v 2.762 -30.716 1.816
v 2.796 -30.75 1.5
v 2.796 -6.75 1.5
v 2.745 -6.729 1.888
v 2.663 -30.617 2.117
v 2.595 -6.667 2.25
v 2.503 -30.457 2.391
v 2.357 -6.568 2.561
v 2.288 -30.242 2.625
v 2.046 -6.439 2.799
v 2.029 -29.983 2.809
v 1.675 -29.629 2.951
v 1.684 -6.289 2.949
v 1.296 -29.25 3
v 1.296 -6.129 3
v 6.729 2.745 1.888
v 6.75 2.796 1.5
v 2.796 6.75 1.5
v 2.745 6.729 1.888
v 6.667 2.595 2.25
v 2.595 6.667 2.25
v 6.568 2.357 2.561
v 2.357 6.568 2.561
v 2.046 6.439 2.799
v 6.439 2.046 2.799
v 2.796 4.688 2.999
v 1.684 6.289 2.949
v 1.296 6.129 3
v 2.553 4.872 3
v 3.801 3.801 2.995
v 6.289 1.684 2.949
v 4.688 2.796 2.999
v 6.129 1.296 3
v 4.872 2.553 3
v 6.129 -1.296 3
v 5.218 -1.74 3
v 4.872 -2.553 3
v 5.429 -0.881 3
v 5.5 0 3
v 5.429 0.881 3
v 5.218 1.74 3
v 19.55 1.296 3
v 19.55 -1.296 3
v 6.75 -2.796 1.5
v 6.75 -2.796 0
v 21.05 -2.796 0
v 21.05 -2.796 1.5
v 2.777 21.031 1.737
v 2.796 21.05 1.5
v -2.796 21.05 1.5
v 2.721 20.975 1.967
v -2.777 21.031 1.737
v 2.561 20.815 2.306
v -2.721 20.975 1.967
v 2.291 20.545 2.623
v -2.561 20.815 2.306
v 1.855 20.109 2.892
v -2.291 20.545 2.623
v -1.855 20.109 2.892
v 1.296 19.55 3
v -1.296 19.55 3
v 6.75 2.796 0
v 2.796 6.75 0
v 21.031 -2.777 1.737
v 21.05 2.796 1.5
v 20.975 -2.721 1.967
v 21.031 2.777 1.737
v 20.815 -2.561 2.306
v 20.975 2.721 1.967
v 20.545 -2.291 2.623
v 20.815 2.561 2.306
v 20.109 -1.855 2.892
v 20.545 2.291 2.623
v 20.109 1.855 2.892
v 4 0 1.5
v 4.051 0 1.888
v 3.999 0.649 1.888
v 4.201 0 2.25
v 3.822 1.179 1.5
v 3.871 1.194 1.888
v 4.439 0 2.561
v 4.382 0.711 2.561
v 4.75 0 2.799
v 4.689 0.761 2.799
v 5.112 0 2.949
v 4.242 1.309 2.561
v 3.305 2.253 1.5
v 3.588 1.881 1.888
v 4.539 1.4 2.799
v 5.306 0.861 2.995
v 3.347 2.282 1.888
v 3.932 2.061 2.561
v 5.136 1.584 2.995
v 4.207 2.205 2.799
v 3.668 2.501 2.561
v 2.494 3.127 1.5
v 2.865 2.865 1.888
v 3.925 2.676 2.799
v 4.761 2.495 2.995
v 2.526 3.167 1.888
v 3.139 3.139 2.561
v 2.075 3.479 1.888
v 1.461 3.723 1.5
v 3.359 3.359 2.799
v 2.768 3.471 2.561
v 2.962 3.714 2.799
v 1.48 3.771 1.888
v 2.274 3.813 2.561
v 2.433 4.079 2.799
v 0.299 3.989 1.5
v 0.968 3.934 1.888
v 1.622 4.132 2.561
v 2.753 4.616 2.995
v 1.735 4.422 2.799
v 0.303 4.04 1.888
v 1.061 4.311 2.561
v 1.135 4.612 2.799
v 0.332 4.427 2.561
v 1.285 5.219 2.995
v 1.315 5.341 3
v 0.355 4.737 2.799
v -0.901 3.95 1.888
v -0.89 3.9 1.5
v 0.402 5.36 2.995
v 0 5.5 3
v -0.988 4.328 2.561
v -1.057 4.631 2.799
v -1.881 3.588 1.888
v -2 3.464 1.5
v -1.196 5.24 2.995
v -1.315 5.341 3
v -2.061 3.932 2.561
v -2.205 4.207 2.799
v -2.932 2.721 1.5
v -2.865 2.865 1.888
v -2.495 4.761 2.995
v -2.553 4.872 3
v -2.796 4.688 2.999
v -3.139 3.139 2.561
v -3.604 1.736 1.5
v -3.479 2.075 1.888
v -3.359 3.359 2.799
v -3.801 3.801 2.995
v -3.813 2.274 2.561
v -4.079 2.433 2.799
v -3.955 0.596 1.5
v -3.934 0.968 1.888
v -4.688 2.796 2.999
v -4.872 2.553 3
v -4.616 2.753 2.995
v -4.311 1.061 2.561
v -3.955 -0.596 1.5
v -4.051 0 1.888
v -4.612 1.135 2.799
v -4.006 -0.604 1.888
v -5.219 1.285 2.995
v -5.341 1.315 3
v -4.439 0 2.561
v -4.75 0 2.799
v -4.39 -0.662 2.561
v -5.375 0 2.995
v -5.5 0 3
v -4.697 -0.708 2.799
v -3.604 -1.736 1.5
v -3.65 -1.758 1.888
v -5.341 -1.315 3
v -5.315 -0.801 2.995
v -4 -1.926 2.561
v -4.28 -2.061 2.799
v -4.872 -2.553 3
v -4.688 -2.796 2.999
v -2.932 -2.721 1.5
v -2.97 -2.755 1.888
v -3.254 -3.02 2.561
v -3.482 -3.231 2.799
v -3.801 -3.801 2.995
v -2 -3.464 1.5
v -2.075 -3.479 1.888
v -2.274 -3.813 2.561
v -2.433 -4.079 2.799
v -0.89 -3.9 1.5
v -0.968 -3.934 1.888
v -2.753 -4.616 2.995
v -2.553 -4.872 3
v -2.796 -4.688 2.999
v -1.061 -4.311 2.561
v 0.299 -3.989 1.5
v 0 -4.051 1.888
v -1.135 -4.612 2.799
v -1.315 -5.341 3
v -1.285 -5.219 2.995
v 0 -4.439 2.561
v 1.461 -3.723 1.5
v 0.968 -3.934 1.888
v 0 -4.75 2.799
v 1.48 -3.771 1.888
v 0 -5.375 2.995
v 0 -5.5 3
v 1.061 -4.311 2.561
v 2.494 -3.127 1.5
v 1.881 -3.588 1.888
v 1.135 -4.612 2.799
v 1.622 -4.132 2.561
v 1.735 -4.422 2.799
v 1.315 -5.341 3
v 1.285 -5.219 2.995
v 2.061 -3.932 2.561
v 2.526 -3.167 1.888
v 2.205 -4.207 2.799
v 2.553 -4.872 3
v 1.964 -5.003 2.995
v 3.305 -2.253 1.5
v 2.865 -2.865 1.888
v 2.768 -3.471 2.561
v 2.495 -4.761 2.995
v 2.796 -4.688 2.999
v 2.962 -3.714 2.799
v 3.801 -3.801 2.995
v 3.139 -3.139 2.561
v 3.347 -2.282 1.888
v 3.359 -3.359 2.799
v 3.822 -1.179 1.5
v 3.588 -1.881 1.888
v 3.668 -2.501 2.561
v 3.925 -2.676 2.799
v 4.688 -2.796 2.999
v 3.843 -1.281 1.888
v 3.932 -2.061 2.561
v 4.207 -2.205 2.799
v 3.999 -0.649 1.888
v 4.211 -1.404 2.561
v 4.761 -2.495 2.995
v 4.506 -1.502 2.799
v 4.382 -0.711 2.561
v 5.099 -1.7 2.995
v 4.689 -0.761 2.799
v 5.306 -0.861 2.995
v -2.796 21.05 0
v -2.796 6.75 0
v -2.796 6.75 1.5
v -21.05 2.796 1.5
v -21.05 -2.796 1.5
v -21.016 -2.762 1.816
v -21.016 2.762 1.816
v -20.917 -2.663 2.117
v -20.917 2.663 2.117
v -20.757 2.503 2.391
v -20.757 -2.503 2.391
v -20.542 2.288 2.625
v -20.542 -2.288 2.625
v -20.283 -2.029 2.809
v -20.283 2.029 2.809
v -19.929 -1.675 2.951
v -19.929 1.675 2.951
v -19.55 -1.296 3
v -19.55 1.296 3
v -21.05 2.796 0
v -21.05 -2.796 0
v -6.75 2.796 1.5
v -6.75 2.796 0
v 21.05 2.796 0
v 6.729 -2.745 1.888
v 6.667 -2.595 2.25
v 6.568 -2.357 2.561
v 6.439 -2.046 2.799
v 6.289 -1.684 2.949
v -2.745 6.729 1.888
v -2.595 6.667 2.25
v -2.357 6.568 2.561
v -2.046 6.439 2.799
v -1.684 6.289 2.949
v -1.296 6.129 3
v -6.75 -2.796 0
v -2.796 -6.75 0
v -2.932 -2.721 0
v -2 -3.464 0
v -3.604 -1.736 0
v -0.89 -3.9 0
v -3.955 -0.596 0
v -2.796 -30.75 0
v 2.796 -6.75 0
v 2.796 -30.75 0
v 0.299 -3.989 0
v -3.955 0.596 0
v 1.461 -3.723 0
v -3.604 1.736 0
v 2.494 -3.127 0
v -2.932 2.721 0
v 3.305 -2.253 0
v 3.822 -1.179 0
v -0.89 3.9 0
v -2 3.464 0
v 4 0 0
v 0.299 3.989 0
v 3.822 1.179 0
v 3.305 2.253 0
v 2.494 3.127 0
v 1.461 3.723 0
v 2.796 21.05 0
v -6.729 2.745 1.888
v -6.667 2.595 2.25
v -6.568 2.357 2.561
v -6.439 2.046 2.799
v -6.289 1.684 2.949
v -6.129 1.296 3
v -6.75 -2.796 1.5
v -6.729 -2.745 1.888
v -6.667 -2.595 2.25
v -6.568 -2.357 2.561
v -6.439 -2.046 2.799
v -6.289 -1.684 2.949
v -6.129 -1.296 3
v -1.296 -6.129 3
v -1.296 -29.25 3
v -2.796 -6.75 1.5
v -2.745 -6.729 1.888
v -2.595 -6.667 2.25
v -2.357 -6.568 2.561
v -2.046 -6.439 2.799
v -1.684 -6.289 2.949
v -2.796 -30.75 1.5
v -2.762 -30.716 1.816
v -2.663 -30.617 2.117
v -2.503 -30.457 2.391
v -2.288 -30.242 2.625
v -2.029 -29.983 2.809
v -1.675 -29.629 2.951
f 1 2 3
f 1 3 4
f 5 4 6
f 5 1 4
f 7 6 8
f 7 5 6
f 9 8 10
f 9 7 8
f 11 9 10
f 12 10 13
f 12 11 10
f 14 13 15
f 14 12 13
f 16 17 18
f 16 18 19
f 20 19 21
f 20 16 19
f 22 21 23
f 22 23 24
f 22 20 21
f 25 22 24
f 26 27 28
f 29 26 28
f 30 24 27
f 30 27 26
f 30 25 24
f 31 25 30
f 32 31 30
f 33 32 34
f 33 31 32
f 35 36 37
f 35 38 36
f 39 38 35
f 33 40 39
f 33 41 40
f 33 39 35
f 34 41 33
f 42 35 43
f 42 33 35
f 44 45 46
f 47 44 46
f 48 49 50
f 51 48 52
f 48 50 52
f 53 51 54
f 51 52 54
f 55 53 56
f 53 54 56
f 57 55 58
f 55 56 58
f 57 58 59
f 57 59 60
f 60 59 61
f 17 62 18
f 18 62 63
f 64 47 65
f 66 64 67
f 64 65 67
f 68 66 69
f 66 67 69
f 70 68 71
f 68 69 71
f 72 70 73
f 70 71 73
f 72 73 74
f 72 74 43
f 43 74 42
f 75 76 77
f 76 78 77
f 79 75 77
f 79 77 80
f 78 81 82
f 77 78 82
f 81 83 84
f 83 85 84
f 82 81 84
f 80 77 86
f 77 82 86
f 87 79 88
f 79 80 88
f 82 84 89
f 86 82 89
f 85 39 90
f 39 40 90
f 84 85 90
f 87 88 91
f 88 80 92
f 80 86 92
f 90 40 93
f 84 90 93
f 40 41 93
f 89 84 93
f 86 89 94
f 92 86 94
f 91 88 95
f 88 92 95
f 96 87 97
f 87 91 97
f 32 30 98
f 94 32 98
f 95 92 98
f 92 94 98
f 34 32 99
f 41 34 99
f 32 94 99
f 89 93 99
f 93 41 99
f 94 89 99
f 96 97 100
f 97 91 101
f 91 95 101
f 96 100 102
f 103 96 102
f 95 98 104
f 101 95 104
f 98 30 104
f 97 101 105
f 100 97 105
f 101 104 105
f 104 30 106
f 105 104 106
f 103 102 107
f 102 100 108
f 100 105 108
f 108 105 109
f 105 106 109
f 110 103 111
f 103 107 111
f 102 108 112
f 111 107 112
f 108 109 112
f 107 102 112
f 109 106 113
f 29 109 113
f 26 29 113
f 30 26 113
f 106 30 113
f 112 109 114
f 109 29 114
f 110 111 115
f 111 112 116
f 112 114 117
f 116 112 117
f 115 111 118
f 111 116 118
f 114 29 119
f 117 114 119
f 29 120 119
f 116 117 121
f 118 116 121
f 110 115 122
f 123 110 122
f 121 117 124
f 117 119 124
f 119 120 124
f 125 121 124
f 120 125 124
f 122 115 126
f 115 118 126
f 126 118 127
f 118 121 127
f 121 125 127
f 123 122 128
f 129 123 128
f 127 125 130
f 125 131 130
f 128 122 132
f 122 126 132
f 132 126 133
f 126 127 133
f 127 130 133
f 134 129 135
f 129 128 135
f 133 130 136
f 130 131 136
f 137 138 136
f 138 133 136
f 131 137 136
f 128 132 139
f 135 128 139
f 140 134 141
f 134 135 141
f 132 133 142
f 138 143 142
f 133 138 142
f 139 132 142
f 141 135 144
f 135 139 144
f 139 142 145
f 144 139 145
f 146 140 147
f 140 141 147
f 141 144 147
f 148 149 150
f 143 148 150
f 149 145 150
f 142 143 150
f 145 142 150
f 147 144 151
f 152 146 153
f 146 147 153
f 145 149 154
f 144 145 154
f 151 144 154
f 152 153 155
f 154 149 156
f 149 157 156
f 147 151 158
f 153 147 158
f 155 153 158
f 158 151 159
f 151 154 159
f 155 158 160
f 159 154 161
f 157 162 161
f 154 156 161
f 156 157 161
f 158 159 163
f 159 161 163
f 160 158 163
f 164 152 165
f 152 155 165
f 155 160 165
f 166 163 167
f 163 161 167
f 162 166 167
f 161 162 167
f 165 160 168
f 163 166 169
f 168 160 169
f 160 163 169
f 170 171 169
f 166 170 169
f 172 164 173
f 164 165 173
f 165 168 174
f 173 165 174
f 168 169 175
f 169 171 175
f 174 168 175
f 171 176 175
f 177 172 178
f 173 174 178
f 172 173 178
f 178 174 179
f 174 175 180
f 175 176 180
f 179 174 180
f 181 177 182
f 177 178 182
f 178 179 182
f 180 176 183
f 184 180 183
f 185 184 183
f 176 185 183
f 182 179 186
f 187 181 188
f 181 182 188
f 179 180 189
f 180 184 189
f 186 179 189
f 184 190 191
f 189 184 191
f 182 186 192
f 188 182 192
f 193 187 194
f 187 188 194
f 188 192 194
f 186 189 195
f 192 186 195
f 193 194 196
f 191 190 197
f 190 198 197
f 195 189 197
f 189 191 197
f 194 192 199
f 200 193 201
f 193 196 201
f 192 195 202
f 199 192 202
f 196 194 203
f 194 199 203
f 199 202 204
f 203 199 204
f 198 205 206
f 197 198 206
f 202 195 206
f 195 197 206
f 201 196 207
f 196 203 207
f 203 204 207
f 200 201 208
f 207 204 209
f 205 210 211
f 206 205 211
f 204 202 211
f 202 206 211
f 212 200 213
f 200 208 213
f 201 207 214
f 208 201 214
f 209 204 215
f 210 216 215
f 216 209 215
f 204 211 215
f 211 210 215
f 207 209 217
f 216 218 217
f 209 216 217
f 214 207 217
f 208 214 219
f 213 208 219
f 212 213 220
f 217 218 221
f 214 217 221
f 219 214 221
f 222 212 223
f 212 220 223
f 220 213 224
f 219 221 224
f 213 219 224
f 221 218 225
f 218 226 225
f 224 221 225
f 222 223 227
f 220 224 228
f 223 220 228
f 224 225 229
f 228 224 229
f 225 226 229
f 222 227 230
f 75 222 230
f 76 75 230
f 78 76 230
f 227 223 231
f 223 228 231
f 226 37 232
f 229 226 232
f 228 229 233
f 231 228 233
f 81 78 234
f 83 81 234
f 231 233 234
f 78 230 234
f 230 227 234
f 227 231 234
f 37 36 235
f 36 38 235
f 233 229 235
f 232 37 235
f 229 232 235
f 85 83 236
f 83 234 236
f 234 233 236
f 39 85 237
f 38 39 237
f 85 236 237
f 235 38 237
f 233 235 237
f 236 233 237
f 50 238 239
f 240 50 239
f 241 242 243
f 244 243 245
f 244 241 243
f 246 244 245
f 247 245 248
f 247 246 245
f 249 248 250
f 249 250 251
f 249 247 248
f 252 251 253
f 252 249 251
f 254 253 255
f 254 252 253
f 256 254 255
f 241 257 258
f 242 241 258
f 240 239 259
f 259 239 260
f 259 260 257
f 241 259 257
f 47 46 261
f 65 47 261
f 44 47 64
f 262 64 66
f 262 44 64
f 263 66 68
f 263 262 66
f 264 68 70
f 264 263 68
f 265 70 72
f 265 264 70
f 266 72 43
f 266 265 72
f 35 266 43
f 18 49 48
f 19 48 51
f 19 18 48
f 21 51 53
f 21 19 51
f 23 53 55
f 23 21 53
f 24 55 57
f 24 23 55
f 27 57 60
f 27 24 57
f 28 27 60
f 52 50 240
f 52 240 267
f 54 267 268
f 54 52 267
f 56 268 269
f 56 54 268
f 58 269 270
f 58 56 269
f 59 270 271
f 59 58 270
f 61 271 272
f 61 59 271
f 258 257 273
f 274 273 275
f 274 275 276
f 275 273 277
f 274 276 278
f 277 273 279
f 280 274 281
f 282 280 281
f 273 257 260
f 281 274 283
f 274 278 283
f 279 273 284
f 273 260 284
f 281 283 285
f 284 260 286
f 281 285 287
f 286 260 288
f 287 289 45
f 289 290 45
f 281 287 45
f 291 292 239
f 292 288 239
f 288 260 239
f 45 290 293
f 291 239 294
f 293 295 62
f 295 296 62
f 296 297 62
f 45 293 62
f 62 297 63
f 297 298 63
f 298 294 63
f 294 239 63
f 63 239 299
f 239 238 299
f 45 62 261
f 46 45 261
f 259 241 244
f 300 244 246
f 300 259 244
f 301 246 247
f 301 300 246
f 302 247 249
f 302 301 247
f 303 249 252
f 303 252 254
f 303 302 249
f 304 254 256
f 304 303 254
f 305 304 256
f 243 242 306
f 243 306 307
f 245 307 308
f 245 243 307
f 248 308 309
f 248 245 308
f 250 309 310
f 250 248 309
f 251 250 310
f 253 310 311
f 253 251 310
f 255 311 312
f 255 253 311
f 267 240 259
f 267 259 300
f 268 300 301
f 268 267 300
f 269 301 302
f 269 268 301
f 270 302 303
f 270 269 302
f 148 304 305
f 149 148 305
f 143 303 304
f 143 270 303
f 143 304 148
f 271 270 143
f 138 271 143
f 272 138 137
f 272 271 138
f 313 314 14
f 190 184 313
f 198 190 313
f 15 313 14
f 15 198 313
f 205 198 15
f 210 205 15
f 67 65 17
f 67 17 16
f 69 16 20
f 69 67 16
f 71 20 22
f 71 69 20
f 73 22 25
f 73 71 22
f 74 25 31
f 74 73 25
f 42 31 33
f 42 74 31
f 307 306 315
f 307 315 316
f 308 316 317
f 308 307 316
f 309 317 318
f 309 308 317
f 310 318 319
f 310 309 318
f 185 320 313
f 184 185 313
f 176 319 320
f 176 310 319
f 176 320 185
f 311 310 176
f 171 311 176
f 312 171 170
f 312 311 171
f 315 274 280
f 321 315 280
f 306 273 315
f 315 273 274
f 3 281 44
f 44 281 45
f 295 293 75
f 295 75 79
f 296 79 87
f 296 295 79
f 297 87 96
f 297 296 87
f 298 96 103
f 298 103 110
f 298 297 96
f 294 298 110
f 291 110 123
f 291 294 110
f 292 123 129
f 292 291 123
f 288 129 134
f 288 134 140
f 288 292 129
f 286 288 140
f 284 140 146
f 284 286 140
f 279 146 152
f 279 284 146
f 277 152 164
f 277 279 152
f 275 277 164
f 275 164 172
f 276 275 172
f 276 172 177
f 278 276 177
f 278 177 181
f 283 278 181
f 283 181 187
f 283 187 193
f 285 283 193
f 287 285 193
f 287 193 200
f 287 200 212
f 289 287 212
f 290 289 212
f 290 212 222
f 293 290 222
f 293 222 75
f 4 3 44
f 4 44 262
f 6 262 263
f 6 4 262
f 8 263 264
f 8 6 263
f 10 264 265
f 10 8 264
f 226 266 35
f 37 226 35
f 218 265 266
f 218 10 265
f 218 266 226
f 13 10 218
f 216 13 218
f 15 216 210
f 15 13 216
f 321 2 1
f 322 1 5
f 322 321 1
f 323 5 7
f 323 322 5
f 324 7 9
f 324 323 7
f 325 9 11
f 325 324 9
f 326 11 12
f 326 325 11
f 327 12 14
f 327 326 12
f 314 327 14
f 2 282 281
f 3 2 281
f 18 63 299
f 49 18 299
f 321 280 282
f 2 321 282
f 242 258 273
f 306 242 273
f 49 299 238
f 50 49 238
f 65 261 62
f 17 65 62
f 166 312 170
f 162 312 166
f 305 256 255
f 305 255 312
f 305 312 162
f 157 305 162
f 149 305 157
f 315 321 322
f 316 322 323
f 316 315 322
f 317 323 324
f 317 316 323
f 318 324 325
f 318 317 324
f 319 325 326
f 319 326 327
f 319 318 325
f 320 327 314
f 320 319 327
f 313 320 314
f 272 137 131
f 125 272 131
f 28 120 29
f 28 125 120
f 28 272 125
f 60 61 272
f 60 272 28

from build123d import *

# Parameters (mm, degrees)
F0_R          = 4
F1_DEPTH      = 3
F2_T1_DEPTH   = 13.091883092
F2_T3_DEPTH   = 13.091883092
F2_T8_DEPTH   = 21.8
F2_T13_DEPTH  = 31.5
F2_T18_DEPTH  = 13.091883092
F2_T24_DEPTH  = 21.8
F2_T29_DEPTH  = 21.8
F2_T34_DEPTH  = 31.5
F2_T39_DEPTH  = 13.091883092
F2_T45_DEPTH  = 13.091883092
F2_T51_DEPTH  = 21.8
F2_T56_DEPTH  = 21.8
F2_T61_DEPTH  = 21.8
F2_T66_DEPTH  = 13.091883092
F2_T75_DEPTH  = 13.091883092
F2_T79_DEPTH  = 21.8
F2_T86_DEPTH  = 31.5
F2_T90_DEPTH  = 13.091883092
F2_T97_DEPTH  = 13.091883092
F2_T101_DEPTH = 21.8
F2_T108_DEPTH = 21.8
F2_T112_DEPTH = 13.091883092
F2_T119_DEPTH = 13.091883092
F2_T123_DEPTH = 31.5
F2_T130_DEPTH = 21.8
F2_T134_DEPTH = 13.091883092
F2_T141_DEPTH = 21.8
F2_T145_DEPTH = 13.091883092
F2_T152_DEPTH = 21.8
F2_T156_DEPTH = 13.091883092


# Not quite as in the source:
# - a fillet or chamfer that OpenCascade refuses, or shapes differently, is made with other operations: its cross-section is extruded or revolved along the edge and cut away or added


with BuildPart() as f1:
    # F0 (on Top) → F1 (new body)
    with BuildSketch(Plane.XY):
        Polygon((-6.75, -2.795941546), (-2.795941546, -6.75), (-2.795941546, -30.75), (2.795941546, -30.75), (2.795941546, -6.75), (6.75, -2.795941546), (21.05, -2.795941546), (21.05, 2.795941546), (6.75, 2.795941546), (2.795941546, 6.75), (2.795941546, 21.05), (-2.795941546, 21.05), (-2.795941546, 6.75), (-6.75, 2.795941546), (-21.05, 2.795941546), (-21.05, -2.795941546), align=None)
        Circle(F0_R, mode=Mode.SUBTRACT)
    extrude(amount=F1_DEPTH)

    # F2: fillet of radius 1.5 on 17 edges, made by hand

    # F2_s2 → F2_t1 (cut)
    with BuildSketch(Plane.XZ.offset(-6.545941546)):
        with BuildLine():
            ThreePointArc((-21.05, 1.5), (-20.6106601718, 2.5606601718), (-19.55, 3))
            Line((-19.55, 3), (-21.05, 3))
            Line((-21.05, 3), (-21.05, 1.5))
        make_face()
        with BuildLine():
            ThreePointArc((21.05, 1.5), (20.6106601718, 2.5606601718), (19.55, 3))
            Line((19.55, 3), (21.05, 3))
            Line((21.05, 3), (21.05, 1.5))
        make_face()
    extrude(amount=F2_T1_DEPTH, mode=Mode.SUBTRACT)

    # F2_s4 → F2_t3 (cut)
    with BuildSketch(Plane.YZ.offset(-6.545941546)):
        with BuildLine():
            ThreePointArc((-30.75, 1.5), (-30.3106601718, 2.5606601718), (-29.25, 3))
            Line((-29.25, 3), (-30.75, 3))
            Line((-30.75, 3), (-30.75, 1.5))
        make_face()
        with BuildLine():
            ThreePointArc((21.05, 1.5), (20.6106601718, 2.5606601718), (19.55, 3))
            Line((19.55, 3), (21.05, 3))
            Line((21.05, 3), (21.05, 1.5))
        make_face()
    extrude(amount=F2_T3_DEPTH, mode=Mode.SUBTRACT)


with BuildPart() as f2_tool6:
    # F2_s7 → F2_t8 (new body)
    with BuildSketch(Plane.YZ.offset(-3)):
        with BuildLine():
            ThreePointArc((2.795941546, 1.5), (2.3566017178, 2.5606601718), (1.295941546, 3))
            Line((1.295941546, 3), (2.795941546, 3))
            Line((2.795941546, 3), (2.795941546, 1.5))
        make_face()
    extrude(amount=-F2_T8_DEPTH)

    split(bisect_by=Plane(origin=(-4.772970773, 4.772970773, 0), x_dir=(0, 0, 1), z_dir=(-0.7071067812, 0.7071067812, 0)), keep=Keep.TOP)


with BuildPart() as f1_1:
    add(f1.part)

    # F2_t5: cut F2_tool6
    add(f2_tool6.part, mode=Mode.SUBTRACT)


with BuildPart() as f2_tool11:
    # F2_s12 → F2_t13 (new body)
    with BuildSketch(Plane.XZ.offset(34.5)):
        with BuildLine():
            ThreePointArc((2.795941546, 1.5), (2.3566017178, 2.5606601718), (1.295941546, 3))
            Line((1.295941546, 3), (2.795941546, 3))
            Line((2.795941546, 3), (2.795941546, 1.5))
        make_face()
    extrude(amount=-F2_T13_DEPTH)

    split(bisect_by=Plane(origin=(4.772970773, -4.772970773, 0), x_dir=(0, 0, 1), z_dir=(0.7071067812, -0.7071067812, 0)), keep=Keep.TOP)


with BuildPart() as f1_2:
    add(f1_1.part)

    # F2_t10: cut F2_tool11
    add(f2_tool11.part, mode=Mode.SUBTRACT)


with BuildPart() as f2_tool16:
    # F2_s17 → F2_t18 (new body)
    with BuildSketch(Plane(origin=(-4.6286796564, -4.6286796564, 0), x_dir=(0, 0, 1), z_dir=(0.7071067812, 0.7071067812, 0))):
        with BuildLine():
            ThreePointArc((1.5, 6.75), (2.5606601718, 6.3106601718), (3, 5.25))
            Line((3, 5.25), (3, 6.75))
            Line((3, 6.75), (1.5, 6.75))
        make_face()
    extrude(amount=F2_T18_DEPTH)

    split(bisect_by=Plane.YZ.offset(2.795941546), keep=Keep.TOP)

    split(bisect_by=Plane.XZ.offset(2.795941546), keep=Keep.TOP)


with BuildPart() as f1_3:
    add(f1_2.part)

    # F2_t15: cut F2_tool16
    add(f2_tool16.part, mode=Mode.SUBTRACT)


with BuildPart() as f2_tool22:
    # F2_s23 → F2_t24 (new body)
    with BuildSketch(Plane.YZ.offset(3)):
        with BuildLine():
            ThreePointArc((-2.795941546, 1.5), (-2.3566017178, 2.5606601718), (-1.295941546, 3))
            Line((-1.295941546, 3), (-2.795941546, 3))
            Line((-2.795941546, 3), (-2.795941546, 1.5))
        make_face()
    extrude(amount=F2_T24_DEPTH)

    split(bisect_by=Plane(origin=(4.772970773, -4.772970773, 0), x_dir=(0, 0, 1), z_dir=(0.7071067812, -0.7071067812, 0)), keep=Keep.TOP)


with BuildPart() as f1_4:
    add(f1_3.part)

    # F2_t21: cut F2_tool22
    add(f2_tool22.part, mode=Mode.SUBTRACT)


with BuildPart() as f2_tool27:
    # F2_s28 → F2_t29 (new body)
    with BuildSketch(Plane.YZ.offset(-24.8)):
        with BuildLine():
            ThreePointArc((-2.795941546, 1.5), (-2.3566017178, 2.5606601718), (-1.295941546, 3))
            Line((-1.295941546, 3), (-2.795941546, 3))
            Line((-2.795941546, 3), (-2.795941546, 1.5))
        make_face()
    extrude(amount=F2_T29_DEPTH)

    split(bisect_by=Plane(origin=(-4.772970773, -4.772970773, 0), x_dir=(0, 0, 1), z_dir=(-0.7071067812, -0.7071067812, 0)), keep=Keep.TOP)


with BuildPart() as f1_5:
    add(f1_4.part)

    # F2_t26: cut F2_tool27
    add(f2_tool27.part, mode=Mode.SUBTRACT)


with BuildPart() as f2_tool32:
    # F2_s33 → F2_t34 (new body)
    with BuildSketch(Plane.XZ.offset(3)):
        with BuildLine():
            ThreePointArc((-2.795941546, 1.5), (-2.3566017178, 2.5606601718), (-1.295941546, 3))
            Line((-1.295941546, 3), (-2.795941546, 3))
            Line((-2.795941546, 3), (-2.795941546, 1.5))
        make_face()
    extrude(amount=F2_T34_DEPTH)

    split(bisect_by=Plane(origin=(-4.772970773, -4.772970773, 0), x_dir=(0, 0, 1), z_dir=(-0.7071067812, -0.7071067812, 0)), keep=Keep.TOP)


with BuildPart() as f1_6:
    add(f1_5.part)

    # F2_t31: cut F2_tool32
    add(f2_tool32.part, mode=Mode.SUBTRACT)


with BuildPart() as f2_tool37:
    # F2_s38 → F2_t39 (new body)
    with BuildSketch(Plane(origin=(-4.6286796564, 4.6286796564, 0), x_dir=(0, 0, 1), z_dir=(0.7071067812, -0.7071067812, 0))):
        with BuildLine():
            ThreePointArc((1.5, 6.75), (2.5606601718, 6.3106601718), (3, 5.25))
            Line((3, 5.25), (3, 6.75))
            Line((3, 6.75), (1.5, 6.75))
        make_face()
    extrude(amount=F2_T39_DEPTH)

    split(bisect_by=Plane.XZ.offset(2.795941546), keep=Keep.TOP)

    split(bisect_by=Plane.YZ.offset(-2.795941546), keep=Keep.BOTTOM)


with BuildPart() as f1_7:
    add(f1_6.part)

    # F2_t36: cut F2_tool37
    add(f2_tool37.part, mode=Mode.SUBTRACT)


with BuildPart() as f2_tool43:
    # F2_s44 → F2_t45 (new body)
    with BuildSketch(Plane(origin=(4.6286796564, 4.6286796564, 0), x_dir=(0, 0, 1), z_dir=(-0.7071067812, -0.7071067812, 0))):
        with BuildLine():
            ThreePointArc((1.5, 6.75), (2.5606601718, 6.3106601718), (3, 5.25))
            Line((3, 5.25), (3, 6.75))
            Line((3, 6.75), (1.5, 6.75))
        make_face()
    extrude(amount=F2_T45_DEPTH)

    split(bisect_by=Plane.YZ.offset(-2.795941546), keep=Keep.BOTTOM)

    split(bisect_by=Plane.XZ.offset(-2.795941546), keep=Keep.BOTTOM)


with BuildPart() as f1_8:
    add(f1_7.part)

    # F2_t42: cut F2_tool43
    add(f2_tool43.part, mode=Mode.SUBTRACT)


with BuildPart() as f2_tool49:
    # F2_s50 → F2_t51 (new body)
    with BuildSketch(Plane.XZ.offset(-24.8)):
        with BuildLine():
            ThreePointArc((-2.795941546, 1.5), (-2.3566017178, 2.5606601718), (-1.295941546, 3))
            Line((-1.295941546, 3), (-2.795941546, 3))
            Line((-2.795941546, 3), (-2.795941546, 1.5))
        make_face()
    extrude(amount=F2_T51_DEPTH)

    split(bisect_by=Plane(origin=(-4.772970773, 4.772970773, 0), x_dir=(0, 0, 1), z_dir=(-0.7071067812, 0.7071067812, 0)), keep=Keep.TOP)


with BuildPart() as f1_9:
    add(f1_8.part)

    # F2_t48: cut F2_tool49
    add(f2_tool49.part, mode=Mode.SUBTRACT)


with BuildPart() as f2_tool54:
    # F2_s55 → F2_t56 (new body)
    with BuildSketch(Plane.XZ.offset(-3)):
        with BuildLine():
            ThreePointArc((2.795941546, 1.5), (2.3566017178, 2.5606601718), (1.295941546, 3))
            Line((1.295941546, 3), (2.795941546, 3))
            Line((2.795941546, 3), (2.795941546, 1.5))
        make_face()
    extrude(amount=-F2_T56_DEPTH)

    split(bisect_by=Plane(origin=(4.772970773, 4.772970773, 0), x_dir=(0, 0, 1), z_dir=(0.7071067812, 0.7071067812, 0)), keep=Keep.TOP)


with BuildPart() as f1_10:
    add(f1_9.part)

    # F2_t53: cut F2_tool54
    add(f2_tool54.part, mode=Mode.SUBTRACT)


with BuildPart() as f2_tool59:
    # F2_s60 → F2_t61 (new body)
    with BuildSketch(Plane.YZ.offset(24.8)):
        with BuildLine():
            ThreePointArc((2.795941546, 1.5), (2.3566017178, 2.5606601718), (1.295941546, 3))
            Line((1.295941546, 3), (2.795941546, 3))
            Line((2.795941546, 3), (2.795941546, 1.5))
        make_face()
    extrude(amount=-F2_T61_DEPTH)

    split(bisect_by=Plane(origin=(4.772970773, 4.772970773, 0), x_dir=(0, 0, 1), z_dir=(0.7071067812, 0.7071067812, 0)), keep=Keep.TOP)


with BuildPart() as f1_11:
    add(f1_10.part)

    # F2_t58: cut F2_tool59
    add(f2_tool59.part, mode=Mode.SUBTRACT)


with BuildPart() as f2_tool64:
    # F2_s65 → F2_t66 (new body)
    with BuildSketch(Plane(origin=(4.6286796564, -4.6286796564, 0), x_dir=(0, 0, 1), z_dir=(-0.7071067812, 0.7071067812, 0))):
        with BuildLine():
            ThreePointArc((1.5, 6.75), (2.5606601718, 6.3106601718), (3, 5.25))
            Line((3, 5.25), (3, 6.75))
            Line((3, 6.75), (1.5, 6.75))
        make_face()
    extrude(amount=F2_T66_DEPTH)

    split(bisect_by=Plane.YZ.offset(2.795941546), keep=Keep.TOP)

    split(bisect_by=Plane.XZ.offset(-2.795941546), keep=Keep.BOTTOM)


with BuildPart() as f1_12:
    add(f1_11.part)

    # F2_t63: cut F2_tool64
    add(f2_tool64.part, mode=Mode.SUBTRACT)

    # F2_s69 → F2_t70 (revolve, cut)
    with BuildSketch(Plane.XZ):
        with BuildLine():
            ThreePointArc((4, 1.5), (4.4393398282, 2.5606601718), (5.5, 3))
            Line((5.5, 3), (4, 3))
            Line((4, 3), (4, 1.5))
        make_face()
    revolve(axis=Axis((0, 0, 3), (0, 0, 1)), mode=Mode.SUBTRACT)


with BuildPart() as f2_tool73:
    # F2_s74 → F2_t75 (new body)
    with BuildSketch(Plane(origin=(4.6286796564, 4.6286796564, 0), x_dir=(0, 0, 1), z_dir=(-0.7071067812, -0.7071067812, 0))):
        with BuildLine():
            ThreePointArc((1.5, 6.75), (2.5606601718, 6.3106601718), (3, 5.25))
            Line((3, 5.25), (3, 6.75))
            Line((3, 6.75), (1.5, 6.75))
        make_face()
    extrude(amount=F2_T75_DEPTH)

    split(bisect_by=Plane.XZ.offset(-2.795941546), keep=Keep.TOP)


with BuildPart() as f2_tool77:
    # F2_s78 → F2_t79 (new body)
    with BuildSketch(Plane.YZ.offset(-3)):
        with BuildLine():
            ThreePointArc((2.795941546, 1.5), (2.3566017178, 2.5606601718), (1.295941546, 3))
            Line((1.295941546, 3), (2.795941546, 3))
            Line((2.795941546, 3), (2.795941546, 1.5))
        make_face()
    extrude(amount=-F2_T79_DEPTH)

    split(bisect_by=Plane(origin=(-4.772970773, 4.772970773, 0), x_dir=(0, 0, 1), z_dir=(0.7071067812, -0.7071067812, 0)), keep=Keep.TOP)


with BuildPart() as f2_tool73_1:
    add(f2_tool73.part)

    # F2_t81: intersect F2_tool77
    add(f2_tool77.part, mode=Mode.INTERSECT)


with BuildPart() as f1_13:
    add(f1_12.part)

    # F2_t71: cut F2_tool73
    add(f2_tool73_1.part, mode=Mode.SUBTRACT)


with BuildPart() as f2_tool84:
    # F2_s85 → F2_t86 (new body)
    with BuildSketch(Plane.XZ.offset(34.5)):
        with BuildLine():
            ThreePointArc((2.795941546, 1.5), (2.3566017178, 2.5606601718), (1.295941546, 3))
            Line((1.295941546, 3), (2.795941546, 3))
            Line((2.795941546, 3), (2.795941546, 1.5))
        make_face()
    extrude(amount=-F2_T86_DEPTH)

    split(bisect_by=Plane(origin=(4.772970773, -4.772970773, 0), x_dir=(0, 0, 1), z_dir=(-0.7071067812, 0.7071067812, 0)), keep=Keep.TOP)


with BuildPart() as f2_tool88:
    # F2_s89 → F2_t90 (new body)
    with BuildSketch(Plane(origin=(-4.6286796564, -4.6286796564, 0), x_dir=(0, 0, 1), z_dir=(0.7071067812, 0.7071067812, 0))):
        with BuildLine():
            ThreePointArc((1.5, 6.75), (2.5606601718, 6.3106601718), (3, 5.25))
            Line((3, 5.25), (3, 6.75))
            Line((3, 6.75), (1.5, 6.75))
        make_face()
    extrude(amount=F2_T90_DEPTH)

    split(bisect_by=Plane.YZ.offset(2.795941546), keep=Keep.BOTTOM)


with BuildPart() as f2_tool84_1:
    add(f2_tool84.part)

    # F2_t92: intersect F2_tool88
    add(f2_tool88.part, mode=Mode.INTERSECT)


with BuildPart() as f1_14:
    add(f1_13.part)

    # F2_t82: cut F2_tool84
    add(f2_tool84_1.part, mode=Mode.SUBTRACT)


with BuildPart() as f2_tool95:
    # F2_s96 → F2_t97 (new body)
    with BuildSketch(Plane(origin=(-4.6286796564, -4.6286796564, 0), x_dir=(0, 0, 1), z_dir=(0.7071067812, 0.7071067812, 0))):
        with BuildLine():
            ThreePointArc((1.5, 6.75), (2.5606601718, 6.3106601718), (3, 5.25))
            Line((3, 5.25), (3, 6.75))
            Line((3, 6.75), (1.5, 6.75))
        make_face()
    extrude(amount=F2_T97_DEPTH)

    split(bisect_by=Plane.XZ.offset(2.795941546), keep=Keep.BOTTOM)


with BuildPart() as f2_tool99:
    # F2_s100 → F2_t101 (new body)
    with BuildSketch(Plane.YZ.offset(3)):
        with BuildLine():
            ThreePointArc((-2.795941546, 1.5), (-2.3566017178, 2.5606601718), (-1.295941546, 3))
            Line((-1.295941546, 3), (-2.795941546, 3))
            Line((-2.795941546, 3), (-2.795941546, 1.5))
        make_face()
    extrude(amount=F2_T101_DEPTH)

    split(bisect_by=Plane(origin=(4.772970773, -4.772970773, 0), x_dir=(0, 0, 1), z_dir=(-0.7071067812, 0.7071067812, 0)), keep=Keep.TOP)


with BuildPart() as f2_tool95_1:
    add(f2_tool95.part)

    # F2_t103: intersect F2_tool99
    add(f2_tool99.part, mode=Mode.INTERSECT)


with BuildPart() as f1_15:
    add(f1_14.part)

    # F2_t93: cut F2_tool95
    add(f2_tool95_1.part, mode=Mode.SUBTRACT)


with BuildPart() as f2_tool106:
    # F2_s107 → F2_t108 (new body)
    with BuildSketch(Plane.YZ.offset(-24.8)):
        with BuildLine():
            ThreePointArc((-2.795941546, 1.5), (-2.3566017178, 2.5606601718), (-1.295941546, 3))
            Line((-1.295941546, 3), (-2.795941546, 3))
            Line((-2.795941546, 3), (-2.795941546, 1.5))
        make_face()
    extrude(amount=F2_T108_DEPTH)

    split(bisect_by=Plane(origin=(-4.772970773, -4.772970773, 0), x_dir=(0, 0, 1), z_dir=(0.7071067812, 0.7071067812, 0)), keep=Keep.TOP)


with BuildPart() as f2_tool110:
    # F2_s111 → F2_t112 (new body)
    with BuildSketch(Plane(origin=(-4.6286796564, 4.6286796564, 0), x_dir=(0, 0, 1), z_dir=(0.7071067812, -0.7071067812, 0))):
        with BuildLine():
            ThreePointArc((1.5, 6.75), (2.5606601718, 6.3106601718), (3, 5.25))
            Line((3, 5.25), (3, 6.75))
            Line((3, 6.75), (1.5, 6.75))
        make_face()
    extrude(amount=F2_T112_DEPTH)

    split(bisect_by=Plane.XZ.offset(2.795941546), keep=Keep.BOTTOM)


with BuildPart() as f2_tool106_1:
    add(f2_tool106.part)

    # F2_t114: intersect F2_tool110
    add(f2_tool110.part, mode=Mode.INTERSECT)


with BuildPart() as f1_16:
    add(f1_15.part)

    # F2_t104: cut F2_tool106
    add(f2_tool106_1.part, mode=Mode.SUBTRACT)


with BuildPart() as f2_tool117:
    # F2_s118 → F2_t119 (new body)
    with BuildSketch(Plane(origin=(-4.6286796564, 4.6286796564, 0), x_dir=(0, 0, 1), z_dir=(0.7071067812, -0.7071067812, 0))):
        with BuildLine():
            ThreePointArc((1.5, 6.75), (2.5606601718, 6.3106601718), (3, 5.25))
            Line((3, 5.25), (3, 6.75))
            Line((3, 6.75), (1.5, 6.75))
        make_face()
    extrude(amount=F2_T119_DEPTH)

    split(bisect_by=Plane.YZ.offset(-2.795941546), keep=Keep.TOP)


with BuildPart() as f2_tool121:
    # F2_s122 → F2_t123 (new body)
    with BuildSketch(Plane.XZ.offset(3)):
        with BuildLine():
            ThreePointArc((-2.795941546, 1.5), (-2.3566017178, 2.5606601718), (-1.295941546, 3))
            Line((-1.295941546, 3), (-2.795941546, 3))
            Line((-2.795941546, 3), (-2.795941546, 1.5))
        make_face()
    extrude(amount=F2_T123_DEPTH)

    split(bisect_by=Plane(origin=(-4.772970773, -4.772970773, 0), x_dir=(0, 0, 1), z_dir=(0.7071067812, 0.7071067812, 0)), keep=Keep.TOP)


with BuildPart() as f2_tool117_1:
    add(f2_tool117.part)

    # F2_t125: intersect F2_tool121
    add(f2_tool121.part, mode=Mode.INTERSECT)


with BuildPart() as f1_17:
    add(f1_16.part)

    # F2_t115: cut F2_tool117
    add(f2_tool117_1.part, mode=Mode.SUBTRACT)


with BuildPart() as f2_tool128:
    # F2_s129 → F2_t130 (new body)
    with BuildSketch(Plane.XZ.offset(-24.8)):
        with BuildLine():
            ThreePointArc((-2.795941546, 1.5), (-2.3566017178, 2.5606601718), (-1.295941546, 3))
            Line((-1.295941546, 3), (-2.795941546, 3))
            Line((-2.795941546, 3), (-2.795941546, 1.5))
        make_face()
    extrude(amount=F2_T130_DEPTH)

    split(bisect_by=Plane(origin=(-4.772970773, 4.772970773, 0), x_dir=(0, 0, 1), z_dir=(0.7071067812, -0.7071067812, 0)), keep=Keep.TOP)


with BuildPart() as f2_tool132:
    # F2_s133 → F2_t134 (new body)
    with BuildSketch(Plane(origin=(4.6286796564, 4.6286796564, 0), x_dir=(0, 0, 1), z_dir=(-0.7071067812, -0.7071067812, 0))):
        with BuildLine():
            ThreePointArc((1.5, 6.75), (2.5606601718, 6.3106601718), (3, 5.25))
            Line((3, 5.25), (3, 6.75))
            Line((3, 6.75), (1.5, 6.75))
        make_face()
    extrude(amount=F2_T134_DEPTH)

    split(bisect_by=Plane.YZ.offset(-2.795941546), keep=Keep.TOP)


with BuildPart() as f2_tool128_1:
    add(f2_tool128.part)

    # F2_t136: intersect F2_tool132
    add(f2_tool132.part, mode=Mode.INTERSECT)


with BuildPart() as f1_18:
    add(f1_17.part)

    # F2_t126: cut F2_tool128
    add(f2_tool128_1.part, mode=Mode.SUBTRACT)


with BuildPart() as f2_tool139:
    # F2_s140 → F2_t141 (new body)
    with BuildSketch(Plane.XZ.offset(-3)):
        with BuildLine():
            ThreePointArc((2.795941546, 1.5), (2.3566017178, 2.5606601718), (1.295941546, 3))
            Line((1.295941546, 3), (2.795941546, 3))
            Line((2.795941546, 3), (2.795941546, 1.5))
        make_face()
    extrude(amount=-F2_T141_DEPTH)

    split(bisect_by=Plane(origin=(4.772970773, 4.772970773, 0), x_dir=(0, 0, 1), z_dir=(-0.7071067812, -0.7071067812, 0)), keep=Keep.TOP)


with BuildPart() as f2_tool143:
    # F2_s144 → F2_t145 (new body)
    with BuildSketch(Plane(origin=(4.6286796564, -4.6286796564, 0), x_dir=(0, 0, 1), z_dir=(-0.7071067812, 0.7071067812, 0))):
        with BuildLine():
            ThreePointArc((1.5, 6.75), (2.5606601718, 6.3106601718), (3, 5.25))
            Line((3, 5.25), (3, 6.75))
            Line((3, 6.75), (1.5, 6.75))
        make_face()
    extrude(amount=F2_T145_DEPTH)

    split(bisect_by=Plane.YZ.offset(2.795941546), keep=Keep.BOTTOM)


with BuildPart() as f2_tool139_1:
    add(f2_tool139.part)

    # F2_t147: intersect F2_tool143
    add(f2_tool143.part, mode=Mode.INTERSECT)


with BuildPart() as f1_19:
    add(f1_18.part)

    # F2_t137: cut F2_tool139
    add(f2_tool139_1.part, mode=Mode.SUBTRACT)


with BuildPart() as f2_tool150:
    # F2_s151 → F2_t152 (new body)
    with BuildSketch(Plane.YZ.offset(24.8)):
        with BuildLine():
            ThreePointArc((2.795941546, 1.5), (2.3566017178, 2.5606601718), (1.295941546, 3))
            Line((1.295941546, 3), (2.795941546, 3))
            Line((2.795941546, 3), (2.795941546, 1.5))
        make_face()
    extrude(amount=-F2_T152_DEPTH)

    split(bisect_by=Plane(origin=(4.772970773, 4.772970773, 0), x_dir=(0, 0, 1), z_dir=(-0.7071067812, -0.7071067812, 0)), keep=Keep.TOP)


with BuildPart() as f2_tool154:
    # F2_s155 → F2_t156 (new body)
    with BuildSketch(Plane(origin=(4.6286796564, -4.6286796564, 0), x_dir=(0, 0, 1), z_dir=(-0.7071067812, 0.7071067812, 0))):
        with BuildLine():
            ThreePointArc((1.5, 6.75), (2.5606601718, 6.3106601718), (3, 5.25))
            Line((3, 5.25), (3, 6.75))
            Line((3, 6.75), (1.5, 6.75))
        make_face()
    extrude(amount=F2_T156_DEPTH)

    split(bisect_by=Plane.XZ.offset(-2.795941546), keep=Keep.TOP)


with BuildPart() as f2_tool150_1:
    add(f2_tool150.part)

    # F2_t158: intersect F2_tool154
    add(f2_tool154.part, mode=Mode.INTERSECT)


with BuildPart() as f1_20:
    add(f1_19.part)

    # F2_t148: cut F2_tool150
    add(f2_tool150_1.part, mode=Mode.SUBTRACT)


solid = f1_20.part
